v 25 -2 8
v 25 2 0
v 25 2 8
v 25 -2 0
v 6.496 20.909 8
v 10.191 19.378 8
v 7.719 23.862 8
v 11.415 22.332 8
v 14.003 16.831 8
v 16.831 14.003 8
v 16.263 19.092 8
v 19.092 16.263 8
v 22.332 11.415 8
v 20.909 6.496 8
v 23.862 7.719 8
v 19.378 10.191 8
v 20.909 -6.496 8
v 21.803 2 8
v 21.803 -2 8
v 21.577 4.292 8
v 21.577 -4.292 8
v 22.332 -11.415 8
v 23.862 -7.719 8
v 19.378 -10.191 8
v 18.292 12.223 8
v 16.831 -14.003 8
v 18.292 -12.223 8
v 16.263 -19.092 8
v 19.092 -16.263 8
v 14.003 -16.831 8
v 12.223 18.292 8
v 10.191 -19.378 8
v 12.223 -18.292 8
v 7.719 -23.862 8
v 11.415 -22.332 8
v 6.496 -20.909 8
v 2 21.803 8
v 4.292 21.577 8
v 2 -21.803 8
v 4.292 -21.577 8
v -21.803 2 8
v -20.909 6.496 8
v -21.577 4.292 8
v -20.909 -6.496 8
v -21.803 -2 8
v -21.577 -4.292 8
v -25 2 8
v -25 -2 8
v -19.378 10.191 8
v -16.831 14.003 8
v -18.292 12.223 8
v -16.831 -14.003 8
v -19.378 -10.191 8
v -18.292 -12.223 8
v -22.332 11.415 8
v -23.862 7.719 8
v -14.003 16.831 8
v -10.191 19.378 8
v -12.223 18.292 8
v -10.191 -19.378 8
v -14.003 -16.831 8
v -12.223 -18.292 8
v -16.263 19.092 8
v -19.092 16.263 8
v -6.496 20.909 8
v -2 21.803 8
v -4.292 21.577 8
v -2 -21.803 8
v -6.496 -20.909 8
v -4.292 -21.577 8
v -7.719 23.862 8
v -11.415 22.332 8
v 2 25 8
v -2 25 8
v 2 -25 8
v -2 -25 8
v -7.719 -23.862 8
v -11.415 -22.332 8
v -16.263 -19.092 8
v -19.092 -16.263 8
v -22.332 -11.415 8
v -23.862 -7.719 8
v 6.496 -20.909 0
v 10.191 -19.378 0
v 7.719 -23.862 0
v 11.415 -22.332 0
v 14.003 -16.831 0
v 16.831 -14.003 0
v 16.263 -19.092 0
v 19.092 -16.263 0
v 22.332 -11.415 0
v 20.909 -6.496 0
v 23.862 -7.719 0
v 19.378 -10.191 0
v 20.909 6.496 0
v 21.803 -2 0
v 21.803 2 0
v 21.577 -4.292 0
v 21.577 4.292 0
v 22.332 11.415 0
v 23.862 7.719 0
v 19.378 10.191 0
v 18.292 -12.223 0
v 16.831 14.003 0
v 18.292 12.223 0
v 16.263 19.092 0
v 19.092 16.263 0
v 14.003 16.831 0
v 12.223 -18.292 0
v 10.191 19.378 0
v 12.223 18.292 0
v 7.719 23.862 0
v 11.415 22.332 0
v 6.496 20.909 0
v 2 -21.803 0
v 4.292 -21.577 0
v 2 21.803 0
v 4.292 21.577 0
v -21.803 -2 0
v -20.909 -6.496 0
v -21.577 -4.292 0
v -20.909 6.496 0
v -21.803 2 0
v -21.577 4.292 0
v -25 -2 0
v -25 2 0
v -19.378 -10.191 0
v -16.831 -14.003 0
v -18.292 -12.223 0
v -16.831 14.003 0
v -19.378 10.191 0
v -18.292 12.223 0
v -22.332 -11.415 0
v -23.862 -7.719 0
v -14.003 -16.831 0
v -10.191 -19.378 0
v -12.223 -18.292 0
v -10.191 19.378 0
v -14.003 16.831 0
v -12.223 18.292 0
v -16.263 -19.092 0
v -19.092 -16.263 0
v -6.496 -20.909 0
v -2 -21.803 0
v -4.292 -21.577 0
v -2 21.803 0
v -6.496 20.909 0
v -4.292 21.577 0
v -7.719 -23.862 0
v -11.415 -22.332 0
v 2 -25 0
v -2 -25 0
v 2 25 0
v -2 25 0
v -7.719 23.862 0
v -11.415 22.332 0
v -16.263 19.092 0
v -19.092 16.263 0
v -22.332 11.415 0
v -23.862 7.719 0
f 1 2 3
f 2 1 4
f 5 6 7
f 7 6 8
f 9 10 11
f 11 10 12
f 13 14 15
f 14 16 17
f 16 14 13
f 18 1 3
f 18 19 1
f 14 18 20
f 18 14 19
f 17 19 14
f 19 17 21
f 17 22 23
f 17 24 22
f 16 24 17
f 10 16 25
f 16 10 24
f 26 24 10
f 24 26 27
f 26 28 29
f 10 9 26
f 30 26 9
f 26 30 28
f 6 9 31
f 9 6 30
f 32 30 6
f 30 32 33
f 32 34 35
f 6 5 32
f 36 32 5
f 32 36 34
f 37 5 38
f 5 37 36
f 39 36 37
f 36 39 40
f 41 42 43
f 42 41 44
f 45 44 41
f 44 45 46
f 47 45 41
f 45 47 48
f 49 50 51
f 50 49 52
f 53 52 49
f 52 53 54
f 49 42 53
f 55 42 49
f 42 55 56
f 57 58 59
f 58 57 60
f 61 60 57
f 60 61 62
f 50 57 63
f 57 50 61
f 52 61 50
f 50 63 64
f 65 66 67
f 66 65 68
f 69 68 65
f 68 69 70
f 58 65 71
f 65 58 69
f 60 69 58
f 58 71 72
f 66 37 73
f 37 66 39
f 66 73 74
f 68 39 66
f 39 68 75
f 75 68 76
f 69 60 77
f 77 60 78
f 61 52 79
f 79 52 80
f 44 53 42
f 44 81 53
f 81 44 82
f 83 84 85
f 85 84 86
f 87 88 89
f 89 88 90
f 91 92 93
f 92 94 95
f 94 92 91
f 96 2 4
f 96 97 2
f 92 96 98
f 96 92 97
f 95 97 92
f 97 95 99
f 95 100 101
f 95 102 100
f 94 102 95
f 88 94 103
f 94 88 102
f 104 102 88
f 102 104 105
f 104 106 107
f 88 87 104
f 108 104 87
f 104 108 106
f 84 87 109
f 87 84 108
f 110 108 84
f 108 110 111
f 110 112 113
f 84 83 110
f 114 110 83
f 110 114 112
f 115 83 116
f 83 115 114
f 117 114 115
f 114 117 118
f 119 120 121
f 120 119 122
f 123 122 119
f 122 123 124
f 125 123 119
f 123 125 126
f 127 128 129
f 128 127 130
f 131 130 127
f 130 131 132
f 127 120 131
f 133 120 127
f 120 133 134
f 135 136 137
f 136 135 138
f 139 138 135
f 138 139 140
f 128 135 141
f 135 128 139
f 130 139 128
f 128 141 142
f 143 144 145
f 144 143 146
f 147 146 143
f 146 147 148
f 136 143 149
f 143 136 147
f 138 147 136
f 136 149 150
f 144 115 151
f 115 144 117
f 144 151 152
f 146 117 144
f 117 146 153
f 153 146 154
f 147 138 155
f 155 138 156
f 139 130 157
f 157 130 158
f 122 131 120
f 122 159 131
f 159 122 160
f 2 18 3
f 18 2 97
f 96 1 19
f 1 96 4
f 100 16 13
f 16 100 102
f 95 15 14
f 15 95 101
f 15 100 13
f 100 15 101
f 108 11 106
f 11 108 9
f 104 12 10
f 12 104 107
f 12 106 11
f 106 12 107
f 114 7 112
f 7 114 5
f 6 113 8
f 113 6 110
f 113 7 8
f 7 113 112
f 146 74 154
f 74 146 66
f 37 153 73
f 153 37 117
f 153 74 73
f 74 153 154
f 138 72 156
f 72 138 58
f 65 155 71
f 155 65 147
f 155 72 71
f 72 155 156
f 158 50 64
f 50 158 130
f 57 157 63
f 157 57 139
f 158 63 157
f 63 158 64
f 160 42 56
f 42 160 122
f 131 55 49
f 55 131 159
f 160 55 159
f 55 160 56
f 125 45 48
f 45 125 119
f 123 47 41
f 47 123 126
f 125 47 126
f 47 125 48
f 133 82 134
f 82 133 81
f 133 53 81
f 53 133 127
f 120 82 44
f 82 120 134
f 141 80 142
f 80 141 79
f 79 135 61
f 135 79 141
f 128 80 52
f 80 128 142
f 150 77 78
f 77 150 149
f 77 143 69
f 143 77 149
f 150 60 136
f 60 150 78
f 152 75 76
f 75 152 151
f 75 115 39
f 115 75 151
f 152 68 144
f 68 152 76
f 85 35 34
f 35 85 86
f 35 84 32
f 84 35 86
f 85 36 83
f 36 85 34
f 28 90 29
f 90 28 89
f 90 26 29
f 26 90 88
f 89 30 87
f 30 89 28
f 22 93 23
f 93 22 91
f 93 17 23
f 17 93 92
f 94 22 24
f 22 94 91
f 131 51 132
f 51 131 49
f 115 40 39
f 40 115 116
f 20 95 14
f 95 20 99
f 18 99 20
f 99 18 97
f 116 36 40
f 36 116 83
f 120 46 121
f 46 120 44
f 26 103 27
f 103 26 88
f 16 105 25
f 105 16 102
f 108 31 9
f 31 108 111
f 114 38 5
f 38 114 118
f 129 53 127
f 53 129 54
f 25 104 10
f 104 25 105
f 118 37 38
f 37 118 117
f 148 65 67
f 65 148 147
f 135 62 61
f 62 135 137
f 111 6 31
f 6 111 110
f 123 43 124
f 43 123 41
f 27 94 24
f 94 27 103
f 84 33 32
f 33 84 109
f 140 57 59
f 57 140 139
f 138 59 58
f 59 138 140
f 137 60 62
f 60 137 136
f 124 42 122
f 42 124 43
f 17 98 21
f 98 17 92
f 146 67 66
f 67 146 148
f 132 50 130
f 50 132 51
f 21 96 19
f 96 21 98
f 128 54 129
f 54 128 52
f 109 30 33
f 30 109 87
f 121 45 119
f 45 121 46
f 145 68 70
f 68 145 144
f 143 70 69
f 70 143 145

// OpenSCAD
$fn = 32;

// ----------------------------------------------------------------------
// Spur blank: plain gear blank
// ----------------------------------------------------------------------

// --- parameters (mm) ---
disc_r = 22;              // blank root radius
disc_t = 8;               // blank thickness
n_teeth = 16;             // stub tooth count
tooth_w = 4;              // tooth width at the root
tooth_h = 3;              // tooth height above the root

out_r = disc_r + tooth_h;  // tip radius
bbox_x = 50.0;  // measured width over the teeth
bbox_y = 50.0;  // measured depth over the teeth

union() {
  cylinder(r = disc_r, h = disc_t);
  for (i = [0 : n_teeth - 1])
    rotate([0, 0, i * 360 / n_teeth])
      translate([disc_r - 1, -tooth_w / 2, 0])
        cube([tooth_h + 1, tooth_w, disc_t]);
}
